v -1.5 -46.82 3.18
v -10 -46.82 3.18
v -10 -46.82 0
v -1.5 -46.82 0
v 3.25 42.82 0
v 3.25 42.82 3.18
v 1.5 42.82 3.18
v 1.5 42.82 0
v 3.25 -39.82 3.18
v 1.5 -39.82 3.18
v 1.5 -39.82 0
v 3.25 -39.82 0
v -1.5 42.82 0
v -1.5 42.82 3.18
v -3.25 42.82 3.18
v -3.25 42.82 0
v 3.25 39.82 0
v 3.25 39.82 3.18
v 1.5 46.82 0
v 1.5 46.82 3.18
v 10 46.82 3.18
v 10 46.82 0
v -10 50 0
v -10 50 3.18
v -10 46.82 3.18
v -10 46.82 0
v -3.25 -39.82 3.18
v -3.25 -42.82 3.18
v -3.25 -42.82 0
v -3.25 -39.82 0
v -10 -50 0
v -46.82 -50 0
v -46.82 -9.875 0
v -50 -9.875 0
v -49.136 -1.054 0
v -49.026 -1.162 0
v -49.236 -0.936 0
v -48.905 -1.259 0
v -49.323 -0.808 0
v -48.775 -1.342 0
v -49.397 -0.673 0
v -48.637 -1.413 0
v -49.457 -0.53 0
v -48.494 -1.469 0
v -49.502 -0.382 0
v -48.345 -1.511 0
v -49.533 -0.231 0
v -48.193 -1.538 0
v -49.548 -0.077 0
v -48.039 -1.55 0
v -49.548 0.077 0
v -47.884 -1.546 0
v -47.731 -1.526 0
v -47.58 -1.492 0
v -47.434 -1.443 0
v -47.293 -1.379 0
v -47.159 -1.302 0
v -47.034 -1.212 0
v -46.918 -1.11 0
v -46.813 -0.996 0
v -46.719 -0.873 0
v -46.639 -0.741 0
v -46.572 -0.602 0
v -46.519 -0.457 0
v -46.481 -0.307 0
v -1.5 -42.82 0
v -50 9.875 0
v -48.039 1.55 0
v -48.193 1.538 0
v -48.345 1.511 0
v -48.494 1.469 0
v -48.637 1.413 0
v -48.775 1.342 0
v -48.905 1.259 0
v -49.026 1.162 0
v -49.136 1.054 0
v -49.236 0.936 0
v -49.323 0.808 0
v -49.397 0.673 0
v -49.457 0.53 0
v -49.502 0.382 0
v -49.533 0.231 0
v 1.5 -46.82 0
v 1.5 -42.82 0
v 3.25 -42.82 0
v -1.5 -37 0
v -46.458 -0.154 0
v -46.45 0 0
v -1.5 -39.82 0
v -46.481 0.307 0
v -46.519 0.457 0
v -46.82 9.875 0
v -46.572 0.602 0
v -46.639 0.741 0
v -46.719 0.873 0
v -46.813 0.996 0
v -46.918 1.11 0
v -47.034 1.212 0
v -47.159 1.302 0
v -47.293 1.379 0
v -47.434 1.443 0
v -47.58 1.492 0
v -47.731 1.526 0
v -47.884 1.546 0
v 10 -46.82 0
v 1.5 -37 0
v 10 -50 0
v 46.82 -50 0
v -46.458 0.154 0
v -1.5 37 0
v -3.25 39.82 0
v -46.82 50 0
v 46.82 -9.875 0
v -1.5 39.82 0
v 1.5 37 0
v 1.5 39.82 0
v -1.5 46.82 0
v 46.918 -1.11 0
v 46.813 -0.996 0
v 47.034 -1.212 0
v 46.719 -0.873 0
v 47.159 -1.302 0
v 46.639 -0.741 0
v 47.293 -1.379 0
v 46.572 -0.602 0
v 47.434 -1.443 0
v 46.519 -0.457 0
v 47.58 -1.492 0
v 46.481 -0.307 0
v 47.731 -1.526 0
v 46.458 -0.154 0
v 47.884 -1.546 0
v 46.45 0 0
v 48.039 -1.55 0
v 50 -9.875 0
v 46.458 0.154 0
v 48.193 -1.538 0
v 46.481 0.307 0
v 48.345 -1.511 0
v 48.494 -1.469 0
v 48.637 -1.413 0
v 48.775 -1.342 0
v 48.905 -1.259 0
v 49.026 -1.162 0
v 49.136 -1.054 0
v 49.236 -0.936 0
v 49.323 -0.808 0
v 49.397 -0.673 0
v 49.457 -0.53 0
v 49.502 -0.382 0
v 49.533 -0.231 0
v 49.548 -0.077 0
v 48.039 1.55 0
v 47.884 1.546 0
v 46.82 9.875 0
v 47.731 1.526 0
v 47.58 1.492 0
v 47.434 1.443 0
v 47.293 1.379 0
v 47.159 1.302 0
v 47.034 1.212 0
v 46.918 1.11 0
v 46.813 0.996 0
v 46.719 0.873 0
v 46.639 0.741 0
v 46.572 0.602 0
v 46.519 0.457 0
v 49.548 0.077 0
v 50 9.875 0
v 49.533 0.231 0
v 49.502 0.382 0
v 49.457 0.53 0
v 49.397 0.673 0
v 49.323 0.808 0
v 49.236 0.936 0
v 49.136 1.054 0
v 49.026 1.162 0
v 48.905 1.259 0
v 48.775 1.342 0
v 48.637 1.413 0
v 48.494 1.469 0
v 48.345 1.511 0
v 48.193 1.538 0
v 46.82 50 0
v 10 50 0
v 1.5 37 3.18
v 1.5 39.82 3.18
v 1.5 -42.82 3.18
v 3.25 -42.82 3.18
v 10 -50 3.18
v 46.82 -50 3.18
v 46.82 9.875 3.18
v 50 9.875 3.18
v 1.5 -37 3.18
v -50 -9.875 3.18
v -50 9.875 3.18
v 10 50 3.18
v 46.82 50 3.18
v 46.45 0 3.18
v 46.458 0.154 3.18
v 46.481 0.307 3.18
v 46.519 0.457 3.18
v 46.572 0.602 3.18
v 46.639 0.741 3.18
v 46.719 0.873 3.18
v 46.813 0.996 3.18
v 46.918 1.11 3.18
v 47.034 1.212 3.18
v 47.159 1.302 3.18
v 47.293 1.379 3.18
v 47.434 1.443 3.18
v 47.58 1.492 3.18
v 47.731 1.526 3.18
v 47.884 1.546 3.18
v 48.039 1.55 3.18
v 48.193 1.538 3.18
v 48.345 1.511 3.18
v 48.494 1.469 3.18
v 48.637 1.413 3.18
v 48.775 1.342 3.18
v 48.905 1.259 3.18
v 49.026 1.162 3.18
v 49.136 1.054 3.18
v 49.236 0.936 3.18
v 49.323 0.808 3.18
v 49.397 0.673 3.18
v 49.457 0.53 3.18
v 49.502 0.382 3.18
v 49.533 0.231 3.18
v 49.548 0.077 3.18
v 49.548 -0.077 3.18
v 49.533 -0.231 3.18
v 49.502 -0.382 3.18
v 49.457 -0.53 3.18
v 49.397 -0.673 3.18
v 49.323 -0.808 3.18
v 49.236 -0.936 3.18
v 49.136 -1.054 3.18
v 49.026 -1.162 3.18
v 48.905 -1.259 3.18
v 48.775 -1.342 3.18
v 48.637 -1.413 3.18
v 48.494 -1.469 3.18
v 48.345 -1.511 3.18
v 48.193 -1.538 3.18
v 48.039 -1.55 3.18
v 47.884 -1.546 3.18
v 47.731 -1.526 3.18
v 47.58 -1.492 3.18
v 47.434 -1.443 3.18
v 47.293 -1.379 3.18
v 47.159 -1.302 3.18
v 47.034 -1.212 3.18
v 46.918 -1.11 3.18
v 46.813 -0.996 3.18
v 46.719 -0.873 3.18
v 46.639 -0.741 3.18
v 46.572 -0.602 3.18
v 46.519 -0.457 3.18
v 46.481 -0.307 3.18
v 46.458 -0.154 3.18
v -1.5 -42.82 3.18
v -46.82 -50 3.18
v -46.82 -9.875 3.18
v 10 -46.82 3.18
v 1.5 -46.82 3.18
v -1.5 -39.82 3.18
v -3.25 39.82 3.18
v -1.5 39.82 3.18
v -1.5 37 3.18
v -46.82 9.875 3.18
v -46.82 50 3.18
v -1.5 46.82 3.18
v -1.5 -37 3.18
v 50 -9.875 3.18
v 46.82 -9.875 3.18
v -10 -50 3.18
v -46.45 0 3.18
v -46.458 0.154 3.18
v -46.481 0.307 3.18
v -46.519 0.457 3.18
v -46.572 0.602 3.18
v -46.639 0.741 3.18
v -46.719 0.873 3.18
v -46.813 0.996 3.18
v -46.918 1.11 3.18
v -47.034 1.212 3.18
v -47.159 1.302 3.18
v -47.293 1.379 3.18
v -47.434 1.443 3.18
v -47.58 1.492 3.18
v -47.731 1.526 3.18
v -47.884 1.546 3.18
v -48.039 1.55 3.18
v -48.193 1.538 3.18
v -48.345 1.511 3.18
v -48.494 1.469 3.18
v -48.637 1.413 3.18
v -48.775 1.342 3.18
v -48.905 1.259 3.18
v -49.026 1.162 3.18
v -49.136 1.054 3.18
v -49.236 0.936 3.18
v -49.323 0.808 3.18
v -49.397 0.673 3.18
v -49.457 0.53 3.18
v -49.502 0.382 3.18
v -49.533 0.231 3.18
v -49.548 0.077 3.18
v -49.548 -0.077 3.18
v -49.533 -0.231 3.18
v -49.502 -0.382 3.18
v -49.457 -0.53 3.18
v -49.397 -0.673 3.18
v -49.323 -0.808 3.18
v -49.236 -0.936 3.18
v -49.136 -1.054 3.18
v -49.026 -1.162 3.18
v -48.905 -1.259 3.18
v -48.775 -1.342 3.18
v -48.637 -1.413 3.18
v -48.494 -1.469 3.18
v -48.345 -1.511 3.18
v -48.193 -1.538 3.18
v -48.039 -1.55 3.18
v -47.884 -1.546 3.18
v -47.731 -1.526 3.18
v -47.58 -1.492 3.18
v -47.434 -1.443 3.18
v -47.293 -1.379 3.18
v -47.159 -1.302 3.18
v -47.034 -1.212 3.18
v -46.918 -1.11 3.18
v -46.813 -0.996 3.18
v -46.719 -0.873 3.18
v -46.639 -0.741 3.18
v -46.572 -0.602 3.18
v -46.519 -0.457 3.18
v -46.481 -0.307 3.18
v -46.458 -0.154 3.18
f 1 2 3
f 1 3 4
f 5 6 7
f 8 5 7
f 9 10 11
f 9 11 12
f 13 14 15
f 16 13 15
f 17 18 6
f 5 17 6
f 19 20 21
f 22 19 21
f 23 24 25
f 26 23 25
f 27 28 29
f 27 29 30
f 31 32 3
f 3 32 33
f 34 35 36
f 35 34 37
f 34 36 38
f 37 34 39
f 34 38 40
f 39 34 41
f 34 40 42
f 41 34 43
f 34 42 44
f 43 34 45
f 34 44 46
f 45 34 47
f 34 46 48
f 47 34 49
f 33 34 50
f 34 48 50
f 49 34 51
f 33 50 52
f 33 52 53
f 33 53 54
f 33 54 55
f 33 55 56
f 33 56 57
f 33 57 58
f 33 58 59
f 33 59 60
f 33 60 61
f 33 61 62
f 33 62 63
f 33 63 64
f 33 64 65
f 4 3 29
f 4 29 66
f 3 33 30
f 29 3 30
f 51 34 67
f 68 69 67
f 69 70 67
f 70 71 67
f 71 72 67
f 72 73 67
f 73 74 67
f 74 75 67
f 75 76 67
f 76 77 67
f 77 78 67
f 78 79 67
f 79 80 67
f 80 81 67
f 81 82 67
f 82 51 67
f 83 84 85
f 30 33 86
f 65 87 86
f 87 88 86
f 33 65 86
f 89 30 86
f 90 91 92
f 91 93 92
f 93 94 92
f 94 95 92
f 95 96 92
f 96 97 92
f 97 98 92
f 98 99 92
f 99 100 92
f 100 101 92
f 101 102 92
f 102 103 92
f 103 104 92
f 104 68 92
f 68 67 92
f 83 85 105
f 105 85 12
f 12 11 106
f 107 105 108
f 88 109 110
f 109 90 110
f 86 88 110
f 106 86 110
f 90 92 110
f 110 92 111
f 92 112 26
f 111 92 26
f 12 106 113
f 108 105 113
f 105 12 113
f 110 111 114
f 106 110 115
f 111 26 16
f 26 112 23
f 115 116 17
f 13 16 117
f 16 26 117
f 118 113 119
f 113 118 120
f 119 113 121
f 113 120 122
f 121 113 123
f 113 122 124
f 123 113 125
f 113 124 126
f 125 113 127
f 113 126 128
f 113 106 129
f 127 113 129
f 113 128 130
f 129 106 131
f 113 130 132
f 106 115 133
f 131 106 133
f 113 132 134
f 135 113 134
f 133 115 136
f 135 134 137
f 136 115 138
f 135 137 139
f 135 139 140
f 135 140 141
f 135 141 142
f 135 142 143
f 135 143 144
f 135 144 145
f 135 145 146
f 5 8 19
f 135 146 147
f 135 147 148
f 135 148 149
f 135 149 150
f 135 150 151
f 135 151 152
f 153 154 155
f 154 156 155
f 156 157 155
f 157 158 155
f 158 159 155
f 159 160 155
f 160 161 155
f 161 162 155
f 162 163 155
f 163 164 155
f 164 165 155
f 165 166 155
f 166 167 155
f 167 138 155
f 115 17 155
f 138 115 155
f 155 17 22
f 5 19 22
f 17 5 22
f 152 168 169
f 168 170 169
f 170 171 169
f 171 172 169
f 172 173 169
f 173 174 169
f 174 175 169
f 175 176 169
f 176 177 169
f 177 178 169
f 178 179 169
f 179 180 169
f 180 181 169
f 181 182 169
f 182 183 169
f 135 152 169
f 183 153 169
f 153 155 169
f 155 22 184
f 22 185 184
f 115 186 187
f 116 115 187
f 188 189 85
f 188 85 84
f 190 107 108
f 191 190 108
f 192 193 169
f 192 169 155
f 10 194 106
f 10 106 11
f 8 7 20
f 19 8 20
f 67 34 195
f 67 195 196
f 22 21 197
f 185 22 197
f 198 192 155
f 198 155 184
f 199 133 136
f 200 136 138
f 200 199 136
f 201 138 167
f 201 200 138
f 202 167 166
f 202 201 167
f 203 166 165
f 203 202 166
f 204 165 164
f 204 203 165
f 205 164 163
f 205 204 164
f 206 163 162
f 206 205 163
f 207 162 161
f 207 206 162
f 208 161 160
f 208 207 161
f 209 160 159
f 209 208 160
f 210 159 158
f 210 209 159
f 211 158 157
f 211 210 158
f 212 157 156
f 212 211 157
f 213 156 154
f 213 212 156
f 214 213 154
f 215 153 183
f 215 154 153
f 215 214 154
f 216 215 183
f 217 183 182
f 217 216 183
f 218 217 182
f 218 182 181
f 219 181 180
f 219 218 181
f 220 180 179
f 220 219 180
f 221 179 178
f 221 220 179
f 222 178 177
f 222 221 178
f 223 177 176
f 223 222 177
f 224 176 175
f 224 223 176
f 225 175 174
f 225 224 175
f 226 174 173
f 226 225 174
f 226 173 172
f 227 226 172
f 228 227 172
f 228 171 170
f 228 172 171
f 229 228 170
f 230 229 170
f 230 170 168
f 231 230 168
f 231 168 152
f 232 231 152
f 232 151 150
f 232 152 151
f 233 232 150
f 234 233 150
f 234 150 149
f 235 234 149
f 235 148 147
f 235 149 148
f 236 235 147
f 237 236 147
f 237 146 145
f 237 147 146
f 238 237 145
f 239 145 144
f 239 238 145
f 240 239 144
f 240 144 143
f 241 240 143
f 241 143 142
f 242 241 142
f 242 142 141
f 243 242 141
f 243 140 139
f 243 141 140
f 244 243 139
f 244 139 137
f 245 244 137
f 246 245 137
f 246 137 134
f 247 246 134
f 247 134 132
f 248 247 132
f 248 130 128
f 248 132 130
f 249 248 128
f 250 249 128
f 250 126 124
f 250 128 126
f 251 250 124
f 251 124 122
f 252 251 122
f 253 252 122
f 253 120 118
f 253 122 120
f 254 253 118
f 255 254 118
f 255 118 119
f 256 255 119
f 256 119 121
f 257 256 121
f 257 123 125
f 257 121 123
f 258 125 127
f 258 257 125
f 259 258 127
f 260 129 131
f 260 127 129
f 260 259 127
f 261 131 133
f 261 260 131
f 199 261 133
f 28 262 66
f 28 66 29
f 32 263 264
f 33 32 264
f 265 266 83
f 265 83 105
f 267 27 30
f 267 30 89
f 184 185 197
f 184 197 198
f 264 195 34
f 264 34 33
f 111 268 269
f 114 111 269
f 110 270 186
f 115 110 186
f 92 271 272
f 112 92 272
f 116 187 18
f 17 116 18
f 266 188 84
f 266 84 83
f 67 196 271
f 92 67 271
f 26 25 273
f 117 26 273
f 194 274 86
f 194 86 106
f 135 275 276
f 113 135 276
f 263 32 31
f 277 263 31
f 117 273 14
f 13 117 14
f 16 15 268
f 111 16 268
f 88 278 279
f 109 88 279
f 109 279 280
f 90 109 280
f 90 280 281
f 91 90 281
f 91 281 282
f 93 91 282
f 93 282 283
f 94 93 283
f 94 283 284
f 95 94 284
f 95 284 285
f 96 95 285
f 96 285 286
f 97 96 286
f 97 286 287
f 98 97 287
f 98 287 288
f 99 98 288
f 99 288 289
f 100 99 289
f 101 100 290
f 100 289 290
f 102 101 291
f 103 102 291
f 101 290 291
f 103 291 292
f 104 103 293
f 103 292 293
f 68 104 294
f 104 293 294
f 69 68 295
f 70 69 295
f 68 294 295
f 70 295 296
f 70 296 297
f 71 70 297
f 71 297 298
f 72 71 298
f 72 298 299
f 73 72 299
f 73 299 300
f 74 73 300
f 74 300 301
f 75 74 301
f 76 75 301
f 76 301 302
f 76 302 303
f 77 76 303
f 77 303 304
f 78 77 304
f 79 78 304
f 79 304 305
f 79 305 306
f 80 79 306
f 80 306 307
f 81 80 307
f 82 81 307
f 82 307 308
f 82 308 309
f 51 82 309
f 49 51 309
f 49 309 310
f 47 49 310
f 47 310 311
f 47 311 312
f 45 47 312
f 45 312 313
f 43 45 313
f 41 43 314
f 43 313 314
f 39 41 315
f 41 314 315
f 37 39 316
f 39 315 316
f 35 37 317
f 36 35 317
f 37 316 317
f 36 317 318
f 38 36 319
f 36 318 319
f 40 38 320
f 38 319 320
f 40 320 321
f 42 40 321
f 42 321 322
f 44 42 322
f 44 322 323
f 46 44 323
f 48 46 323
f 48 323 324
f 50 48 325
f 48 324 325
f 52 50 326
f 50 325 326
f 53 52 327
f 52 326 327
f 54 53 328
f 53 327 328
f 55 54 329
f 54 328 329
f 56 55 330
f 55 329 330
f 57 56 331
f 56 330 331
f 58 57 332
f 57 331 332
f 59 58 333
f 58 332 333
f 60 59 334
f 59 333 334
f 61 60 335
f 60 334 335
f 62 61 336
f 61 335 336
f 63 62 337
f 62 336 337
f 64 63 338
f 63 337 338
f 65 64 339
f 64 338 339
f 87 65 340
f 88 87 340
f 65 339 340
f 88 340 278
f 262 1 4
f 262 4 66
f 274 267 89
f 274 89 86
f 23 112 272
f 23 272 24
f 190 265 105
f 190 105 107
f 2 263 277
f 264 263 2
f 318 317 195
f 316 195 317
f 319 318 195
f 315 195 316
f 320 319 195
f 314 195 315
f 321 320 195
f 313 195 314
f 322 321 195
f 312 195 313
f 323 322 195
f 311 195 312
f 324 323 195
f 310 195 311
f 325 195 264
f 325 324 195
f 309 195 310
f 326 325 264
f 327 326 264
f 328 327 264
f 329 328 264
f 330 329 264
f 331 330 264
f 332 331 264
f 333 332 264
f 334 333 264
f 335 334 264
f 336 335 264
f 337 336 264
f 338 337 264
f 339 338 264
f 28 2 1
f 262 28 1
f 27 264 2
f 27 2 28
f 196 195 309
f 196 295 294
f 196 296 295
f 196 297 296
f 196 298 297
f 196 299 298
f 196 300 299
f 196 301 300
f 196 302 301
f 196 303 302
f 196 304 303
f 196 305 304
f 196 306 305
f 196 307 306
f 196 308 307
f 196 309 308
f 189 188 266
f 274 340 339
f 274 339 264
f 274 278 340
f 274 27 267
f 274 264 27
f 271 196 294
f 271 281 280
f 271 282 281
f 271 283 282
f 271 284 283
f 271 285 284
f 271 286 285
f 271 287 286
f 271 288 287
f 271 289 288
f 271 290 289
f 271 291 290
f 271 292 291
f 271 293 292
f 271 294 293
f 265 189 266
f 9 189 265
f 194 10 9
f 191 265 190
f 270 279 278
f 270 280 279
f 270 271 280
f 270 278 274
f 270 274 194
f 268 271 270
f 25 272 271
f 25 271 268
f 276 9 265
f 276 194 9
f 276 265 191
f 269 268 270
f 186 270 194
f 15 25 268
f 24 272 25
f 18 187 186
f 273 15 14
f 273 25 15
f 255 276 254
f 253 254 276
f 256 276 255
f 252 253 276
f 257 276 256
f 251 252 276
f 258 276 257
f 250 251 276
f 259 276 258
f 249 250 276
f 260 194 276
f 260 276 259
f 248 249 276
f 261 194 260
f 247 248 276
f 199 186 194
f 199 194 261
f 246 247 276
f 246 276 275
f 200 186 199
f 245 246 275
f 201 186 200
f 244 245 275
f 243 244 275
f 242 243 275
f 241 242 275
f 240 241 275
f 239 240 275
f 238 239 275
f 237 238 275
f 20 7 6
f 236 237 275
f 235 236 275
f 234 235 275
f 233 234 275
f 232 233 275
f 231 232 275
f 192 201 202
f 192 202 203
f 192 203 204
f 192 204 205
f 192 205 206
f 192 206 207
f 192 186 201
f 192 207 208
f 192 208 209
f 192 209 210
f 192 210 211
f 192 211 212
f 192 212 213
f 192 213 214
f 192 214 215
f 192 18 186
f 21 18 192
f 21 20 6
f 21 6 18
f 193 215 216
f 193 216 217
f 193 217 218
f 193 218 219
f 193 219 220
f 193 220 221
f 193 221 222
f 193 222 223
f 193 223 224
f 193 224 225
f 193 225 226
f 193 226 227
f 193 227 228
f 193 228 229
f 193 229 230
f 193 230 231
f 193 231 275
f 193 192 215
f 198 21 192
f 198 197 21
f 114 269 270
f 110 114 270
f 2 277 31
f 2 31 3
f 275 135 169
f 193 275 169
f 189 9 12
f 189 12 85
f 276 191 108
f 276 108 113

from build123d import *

# Parameters (mm, degrees)
SKETCH1_W           = 100
SKETCH1_H           = 100
BOSS_EXTRUDE2_DEPTH = 3.18
SKETCH2_R           = 1.55
SKETCH2_W           = 3.18
SKETCH2_H           = 40.125
CUT_EXTRUDE1_DEPTH  = 4.18


with BuildPart() as part:
    # Sketch1 → Boss-Extrude2 (new body)
    with BuildSketch(Plane.XY):
        Rectangle(SKETCH1_W, SKETCH1_H)
    extrude(amount=BOSS_EXTRUDE2_DEPTH)

    # Sketch2 → Cut-Extrude1 (cut, through all)
    with BuildSketch(Plane.XY.offset(3.18)):
        with Locations((-48, 0)):
            Circle(SKETCH2_R)
        Polygon((-10, 50), (-10, 46.82), (-1.5, 46.82), (-1.5, 42.82), (-3.25, 42.82), (-3.25, 39.82), (-1.5, 39.82), (-1.5, 37), (1.5, 37), (1.5, 39.82), (3.25, 39.82), (3.25, 42.82), (1.5, 42.82), (1.5, 46.82), (10, 46.82), (10, 50), align=None)
        with Locations((-48.41, 29.9375)):
            Rectangle(SKETCH2_W, SKETCH2_H)
        with Locations((-48.41, -29.9375)):
            Rectangle(SKETCH2_W, SKETCH2_H)
    cut_extrude1 = extrude(amount=-CUT_EXTRUDE1_DEPTH, mode=Mode.SUBTRACT)

    # Mirror1: Cut-Extrude1 across plane
    add(cut_extrude1.mirror(Plane.ZX), mode=Mode.SUBTRACT)

    # Mirror3: Cut-Extrude1 across plane
    add(cut_extrude1.mirror(Plane(origin=(0, 0, 0), x_dir=(0, 0, 1), z_dir=(1, 0, 0))), mode=Mode.SUBTRACT)


solid = part.part
